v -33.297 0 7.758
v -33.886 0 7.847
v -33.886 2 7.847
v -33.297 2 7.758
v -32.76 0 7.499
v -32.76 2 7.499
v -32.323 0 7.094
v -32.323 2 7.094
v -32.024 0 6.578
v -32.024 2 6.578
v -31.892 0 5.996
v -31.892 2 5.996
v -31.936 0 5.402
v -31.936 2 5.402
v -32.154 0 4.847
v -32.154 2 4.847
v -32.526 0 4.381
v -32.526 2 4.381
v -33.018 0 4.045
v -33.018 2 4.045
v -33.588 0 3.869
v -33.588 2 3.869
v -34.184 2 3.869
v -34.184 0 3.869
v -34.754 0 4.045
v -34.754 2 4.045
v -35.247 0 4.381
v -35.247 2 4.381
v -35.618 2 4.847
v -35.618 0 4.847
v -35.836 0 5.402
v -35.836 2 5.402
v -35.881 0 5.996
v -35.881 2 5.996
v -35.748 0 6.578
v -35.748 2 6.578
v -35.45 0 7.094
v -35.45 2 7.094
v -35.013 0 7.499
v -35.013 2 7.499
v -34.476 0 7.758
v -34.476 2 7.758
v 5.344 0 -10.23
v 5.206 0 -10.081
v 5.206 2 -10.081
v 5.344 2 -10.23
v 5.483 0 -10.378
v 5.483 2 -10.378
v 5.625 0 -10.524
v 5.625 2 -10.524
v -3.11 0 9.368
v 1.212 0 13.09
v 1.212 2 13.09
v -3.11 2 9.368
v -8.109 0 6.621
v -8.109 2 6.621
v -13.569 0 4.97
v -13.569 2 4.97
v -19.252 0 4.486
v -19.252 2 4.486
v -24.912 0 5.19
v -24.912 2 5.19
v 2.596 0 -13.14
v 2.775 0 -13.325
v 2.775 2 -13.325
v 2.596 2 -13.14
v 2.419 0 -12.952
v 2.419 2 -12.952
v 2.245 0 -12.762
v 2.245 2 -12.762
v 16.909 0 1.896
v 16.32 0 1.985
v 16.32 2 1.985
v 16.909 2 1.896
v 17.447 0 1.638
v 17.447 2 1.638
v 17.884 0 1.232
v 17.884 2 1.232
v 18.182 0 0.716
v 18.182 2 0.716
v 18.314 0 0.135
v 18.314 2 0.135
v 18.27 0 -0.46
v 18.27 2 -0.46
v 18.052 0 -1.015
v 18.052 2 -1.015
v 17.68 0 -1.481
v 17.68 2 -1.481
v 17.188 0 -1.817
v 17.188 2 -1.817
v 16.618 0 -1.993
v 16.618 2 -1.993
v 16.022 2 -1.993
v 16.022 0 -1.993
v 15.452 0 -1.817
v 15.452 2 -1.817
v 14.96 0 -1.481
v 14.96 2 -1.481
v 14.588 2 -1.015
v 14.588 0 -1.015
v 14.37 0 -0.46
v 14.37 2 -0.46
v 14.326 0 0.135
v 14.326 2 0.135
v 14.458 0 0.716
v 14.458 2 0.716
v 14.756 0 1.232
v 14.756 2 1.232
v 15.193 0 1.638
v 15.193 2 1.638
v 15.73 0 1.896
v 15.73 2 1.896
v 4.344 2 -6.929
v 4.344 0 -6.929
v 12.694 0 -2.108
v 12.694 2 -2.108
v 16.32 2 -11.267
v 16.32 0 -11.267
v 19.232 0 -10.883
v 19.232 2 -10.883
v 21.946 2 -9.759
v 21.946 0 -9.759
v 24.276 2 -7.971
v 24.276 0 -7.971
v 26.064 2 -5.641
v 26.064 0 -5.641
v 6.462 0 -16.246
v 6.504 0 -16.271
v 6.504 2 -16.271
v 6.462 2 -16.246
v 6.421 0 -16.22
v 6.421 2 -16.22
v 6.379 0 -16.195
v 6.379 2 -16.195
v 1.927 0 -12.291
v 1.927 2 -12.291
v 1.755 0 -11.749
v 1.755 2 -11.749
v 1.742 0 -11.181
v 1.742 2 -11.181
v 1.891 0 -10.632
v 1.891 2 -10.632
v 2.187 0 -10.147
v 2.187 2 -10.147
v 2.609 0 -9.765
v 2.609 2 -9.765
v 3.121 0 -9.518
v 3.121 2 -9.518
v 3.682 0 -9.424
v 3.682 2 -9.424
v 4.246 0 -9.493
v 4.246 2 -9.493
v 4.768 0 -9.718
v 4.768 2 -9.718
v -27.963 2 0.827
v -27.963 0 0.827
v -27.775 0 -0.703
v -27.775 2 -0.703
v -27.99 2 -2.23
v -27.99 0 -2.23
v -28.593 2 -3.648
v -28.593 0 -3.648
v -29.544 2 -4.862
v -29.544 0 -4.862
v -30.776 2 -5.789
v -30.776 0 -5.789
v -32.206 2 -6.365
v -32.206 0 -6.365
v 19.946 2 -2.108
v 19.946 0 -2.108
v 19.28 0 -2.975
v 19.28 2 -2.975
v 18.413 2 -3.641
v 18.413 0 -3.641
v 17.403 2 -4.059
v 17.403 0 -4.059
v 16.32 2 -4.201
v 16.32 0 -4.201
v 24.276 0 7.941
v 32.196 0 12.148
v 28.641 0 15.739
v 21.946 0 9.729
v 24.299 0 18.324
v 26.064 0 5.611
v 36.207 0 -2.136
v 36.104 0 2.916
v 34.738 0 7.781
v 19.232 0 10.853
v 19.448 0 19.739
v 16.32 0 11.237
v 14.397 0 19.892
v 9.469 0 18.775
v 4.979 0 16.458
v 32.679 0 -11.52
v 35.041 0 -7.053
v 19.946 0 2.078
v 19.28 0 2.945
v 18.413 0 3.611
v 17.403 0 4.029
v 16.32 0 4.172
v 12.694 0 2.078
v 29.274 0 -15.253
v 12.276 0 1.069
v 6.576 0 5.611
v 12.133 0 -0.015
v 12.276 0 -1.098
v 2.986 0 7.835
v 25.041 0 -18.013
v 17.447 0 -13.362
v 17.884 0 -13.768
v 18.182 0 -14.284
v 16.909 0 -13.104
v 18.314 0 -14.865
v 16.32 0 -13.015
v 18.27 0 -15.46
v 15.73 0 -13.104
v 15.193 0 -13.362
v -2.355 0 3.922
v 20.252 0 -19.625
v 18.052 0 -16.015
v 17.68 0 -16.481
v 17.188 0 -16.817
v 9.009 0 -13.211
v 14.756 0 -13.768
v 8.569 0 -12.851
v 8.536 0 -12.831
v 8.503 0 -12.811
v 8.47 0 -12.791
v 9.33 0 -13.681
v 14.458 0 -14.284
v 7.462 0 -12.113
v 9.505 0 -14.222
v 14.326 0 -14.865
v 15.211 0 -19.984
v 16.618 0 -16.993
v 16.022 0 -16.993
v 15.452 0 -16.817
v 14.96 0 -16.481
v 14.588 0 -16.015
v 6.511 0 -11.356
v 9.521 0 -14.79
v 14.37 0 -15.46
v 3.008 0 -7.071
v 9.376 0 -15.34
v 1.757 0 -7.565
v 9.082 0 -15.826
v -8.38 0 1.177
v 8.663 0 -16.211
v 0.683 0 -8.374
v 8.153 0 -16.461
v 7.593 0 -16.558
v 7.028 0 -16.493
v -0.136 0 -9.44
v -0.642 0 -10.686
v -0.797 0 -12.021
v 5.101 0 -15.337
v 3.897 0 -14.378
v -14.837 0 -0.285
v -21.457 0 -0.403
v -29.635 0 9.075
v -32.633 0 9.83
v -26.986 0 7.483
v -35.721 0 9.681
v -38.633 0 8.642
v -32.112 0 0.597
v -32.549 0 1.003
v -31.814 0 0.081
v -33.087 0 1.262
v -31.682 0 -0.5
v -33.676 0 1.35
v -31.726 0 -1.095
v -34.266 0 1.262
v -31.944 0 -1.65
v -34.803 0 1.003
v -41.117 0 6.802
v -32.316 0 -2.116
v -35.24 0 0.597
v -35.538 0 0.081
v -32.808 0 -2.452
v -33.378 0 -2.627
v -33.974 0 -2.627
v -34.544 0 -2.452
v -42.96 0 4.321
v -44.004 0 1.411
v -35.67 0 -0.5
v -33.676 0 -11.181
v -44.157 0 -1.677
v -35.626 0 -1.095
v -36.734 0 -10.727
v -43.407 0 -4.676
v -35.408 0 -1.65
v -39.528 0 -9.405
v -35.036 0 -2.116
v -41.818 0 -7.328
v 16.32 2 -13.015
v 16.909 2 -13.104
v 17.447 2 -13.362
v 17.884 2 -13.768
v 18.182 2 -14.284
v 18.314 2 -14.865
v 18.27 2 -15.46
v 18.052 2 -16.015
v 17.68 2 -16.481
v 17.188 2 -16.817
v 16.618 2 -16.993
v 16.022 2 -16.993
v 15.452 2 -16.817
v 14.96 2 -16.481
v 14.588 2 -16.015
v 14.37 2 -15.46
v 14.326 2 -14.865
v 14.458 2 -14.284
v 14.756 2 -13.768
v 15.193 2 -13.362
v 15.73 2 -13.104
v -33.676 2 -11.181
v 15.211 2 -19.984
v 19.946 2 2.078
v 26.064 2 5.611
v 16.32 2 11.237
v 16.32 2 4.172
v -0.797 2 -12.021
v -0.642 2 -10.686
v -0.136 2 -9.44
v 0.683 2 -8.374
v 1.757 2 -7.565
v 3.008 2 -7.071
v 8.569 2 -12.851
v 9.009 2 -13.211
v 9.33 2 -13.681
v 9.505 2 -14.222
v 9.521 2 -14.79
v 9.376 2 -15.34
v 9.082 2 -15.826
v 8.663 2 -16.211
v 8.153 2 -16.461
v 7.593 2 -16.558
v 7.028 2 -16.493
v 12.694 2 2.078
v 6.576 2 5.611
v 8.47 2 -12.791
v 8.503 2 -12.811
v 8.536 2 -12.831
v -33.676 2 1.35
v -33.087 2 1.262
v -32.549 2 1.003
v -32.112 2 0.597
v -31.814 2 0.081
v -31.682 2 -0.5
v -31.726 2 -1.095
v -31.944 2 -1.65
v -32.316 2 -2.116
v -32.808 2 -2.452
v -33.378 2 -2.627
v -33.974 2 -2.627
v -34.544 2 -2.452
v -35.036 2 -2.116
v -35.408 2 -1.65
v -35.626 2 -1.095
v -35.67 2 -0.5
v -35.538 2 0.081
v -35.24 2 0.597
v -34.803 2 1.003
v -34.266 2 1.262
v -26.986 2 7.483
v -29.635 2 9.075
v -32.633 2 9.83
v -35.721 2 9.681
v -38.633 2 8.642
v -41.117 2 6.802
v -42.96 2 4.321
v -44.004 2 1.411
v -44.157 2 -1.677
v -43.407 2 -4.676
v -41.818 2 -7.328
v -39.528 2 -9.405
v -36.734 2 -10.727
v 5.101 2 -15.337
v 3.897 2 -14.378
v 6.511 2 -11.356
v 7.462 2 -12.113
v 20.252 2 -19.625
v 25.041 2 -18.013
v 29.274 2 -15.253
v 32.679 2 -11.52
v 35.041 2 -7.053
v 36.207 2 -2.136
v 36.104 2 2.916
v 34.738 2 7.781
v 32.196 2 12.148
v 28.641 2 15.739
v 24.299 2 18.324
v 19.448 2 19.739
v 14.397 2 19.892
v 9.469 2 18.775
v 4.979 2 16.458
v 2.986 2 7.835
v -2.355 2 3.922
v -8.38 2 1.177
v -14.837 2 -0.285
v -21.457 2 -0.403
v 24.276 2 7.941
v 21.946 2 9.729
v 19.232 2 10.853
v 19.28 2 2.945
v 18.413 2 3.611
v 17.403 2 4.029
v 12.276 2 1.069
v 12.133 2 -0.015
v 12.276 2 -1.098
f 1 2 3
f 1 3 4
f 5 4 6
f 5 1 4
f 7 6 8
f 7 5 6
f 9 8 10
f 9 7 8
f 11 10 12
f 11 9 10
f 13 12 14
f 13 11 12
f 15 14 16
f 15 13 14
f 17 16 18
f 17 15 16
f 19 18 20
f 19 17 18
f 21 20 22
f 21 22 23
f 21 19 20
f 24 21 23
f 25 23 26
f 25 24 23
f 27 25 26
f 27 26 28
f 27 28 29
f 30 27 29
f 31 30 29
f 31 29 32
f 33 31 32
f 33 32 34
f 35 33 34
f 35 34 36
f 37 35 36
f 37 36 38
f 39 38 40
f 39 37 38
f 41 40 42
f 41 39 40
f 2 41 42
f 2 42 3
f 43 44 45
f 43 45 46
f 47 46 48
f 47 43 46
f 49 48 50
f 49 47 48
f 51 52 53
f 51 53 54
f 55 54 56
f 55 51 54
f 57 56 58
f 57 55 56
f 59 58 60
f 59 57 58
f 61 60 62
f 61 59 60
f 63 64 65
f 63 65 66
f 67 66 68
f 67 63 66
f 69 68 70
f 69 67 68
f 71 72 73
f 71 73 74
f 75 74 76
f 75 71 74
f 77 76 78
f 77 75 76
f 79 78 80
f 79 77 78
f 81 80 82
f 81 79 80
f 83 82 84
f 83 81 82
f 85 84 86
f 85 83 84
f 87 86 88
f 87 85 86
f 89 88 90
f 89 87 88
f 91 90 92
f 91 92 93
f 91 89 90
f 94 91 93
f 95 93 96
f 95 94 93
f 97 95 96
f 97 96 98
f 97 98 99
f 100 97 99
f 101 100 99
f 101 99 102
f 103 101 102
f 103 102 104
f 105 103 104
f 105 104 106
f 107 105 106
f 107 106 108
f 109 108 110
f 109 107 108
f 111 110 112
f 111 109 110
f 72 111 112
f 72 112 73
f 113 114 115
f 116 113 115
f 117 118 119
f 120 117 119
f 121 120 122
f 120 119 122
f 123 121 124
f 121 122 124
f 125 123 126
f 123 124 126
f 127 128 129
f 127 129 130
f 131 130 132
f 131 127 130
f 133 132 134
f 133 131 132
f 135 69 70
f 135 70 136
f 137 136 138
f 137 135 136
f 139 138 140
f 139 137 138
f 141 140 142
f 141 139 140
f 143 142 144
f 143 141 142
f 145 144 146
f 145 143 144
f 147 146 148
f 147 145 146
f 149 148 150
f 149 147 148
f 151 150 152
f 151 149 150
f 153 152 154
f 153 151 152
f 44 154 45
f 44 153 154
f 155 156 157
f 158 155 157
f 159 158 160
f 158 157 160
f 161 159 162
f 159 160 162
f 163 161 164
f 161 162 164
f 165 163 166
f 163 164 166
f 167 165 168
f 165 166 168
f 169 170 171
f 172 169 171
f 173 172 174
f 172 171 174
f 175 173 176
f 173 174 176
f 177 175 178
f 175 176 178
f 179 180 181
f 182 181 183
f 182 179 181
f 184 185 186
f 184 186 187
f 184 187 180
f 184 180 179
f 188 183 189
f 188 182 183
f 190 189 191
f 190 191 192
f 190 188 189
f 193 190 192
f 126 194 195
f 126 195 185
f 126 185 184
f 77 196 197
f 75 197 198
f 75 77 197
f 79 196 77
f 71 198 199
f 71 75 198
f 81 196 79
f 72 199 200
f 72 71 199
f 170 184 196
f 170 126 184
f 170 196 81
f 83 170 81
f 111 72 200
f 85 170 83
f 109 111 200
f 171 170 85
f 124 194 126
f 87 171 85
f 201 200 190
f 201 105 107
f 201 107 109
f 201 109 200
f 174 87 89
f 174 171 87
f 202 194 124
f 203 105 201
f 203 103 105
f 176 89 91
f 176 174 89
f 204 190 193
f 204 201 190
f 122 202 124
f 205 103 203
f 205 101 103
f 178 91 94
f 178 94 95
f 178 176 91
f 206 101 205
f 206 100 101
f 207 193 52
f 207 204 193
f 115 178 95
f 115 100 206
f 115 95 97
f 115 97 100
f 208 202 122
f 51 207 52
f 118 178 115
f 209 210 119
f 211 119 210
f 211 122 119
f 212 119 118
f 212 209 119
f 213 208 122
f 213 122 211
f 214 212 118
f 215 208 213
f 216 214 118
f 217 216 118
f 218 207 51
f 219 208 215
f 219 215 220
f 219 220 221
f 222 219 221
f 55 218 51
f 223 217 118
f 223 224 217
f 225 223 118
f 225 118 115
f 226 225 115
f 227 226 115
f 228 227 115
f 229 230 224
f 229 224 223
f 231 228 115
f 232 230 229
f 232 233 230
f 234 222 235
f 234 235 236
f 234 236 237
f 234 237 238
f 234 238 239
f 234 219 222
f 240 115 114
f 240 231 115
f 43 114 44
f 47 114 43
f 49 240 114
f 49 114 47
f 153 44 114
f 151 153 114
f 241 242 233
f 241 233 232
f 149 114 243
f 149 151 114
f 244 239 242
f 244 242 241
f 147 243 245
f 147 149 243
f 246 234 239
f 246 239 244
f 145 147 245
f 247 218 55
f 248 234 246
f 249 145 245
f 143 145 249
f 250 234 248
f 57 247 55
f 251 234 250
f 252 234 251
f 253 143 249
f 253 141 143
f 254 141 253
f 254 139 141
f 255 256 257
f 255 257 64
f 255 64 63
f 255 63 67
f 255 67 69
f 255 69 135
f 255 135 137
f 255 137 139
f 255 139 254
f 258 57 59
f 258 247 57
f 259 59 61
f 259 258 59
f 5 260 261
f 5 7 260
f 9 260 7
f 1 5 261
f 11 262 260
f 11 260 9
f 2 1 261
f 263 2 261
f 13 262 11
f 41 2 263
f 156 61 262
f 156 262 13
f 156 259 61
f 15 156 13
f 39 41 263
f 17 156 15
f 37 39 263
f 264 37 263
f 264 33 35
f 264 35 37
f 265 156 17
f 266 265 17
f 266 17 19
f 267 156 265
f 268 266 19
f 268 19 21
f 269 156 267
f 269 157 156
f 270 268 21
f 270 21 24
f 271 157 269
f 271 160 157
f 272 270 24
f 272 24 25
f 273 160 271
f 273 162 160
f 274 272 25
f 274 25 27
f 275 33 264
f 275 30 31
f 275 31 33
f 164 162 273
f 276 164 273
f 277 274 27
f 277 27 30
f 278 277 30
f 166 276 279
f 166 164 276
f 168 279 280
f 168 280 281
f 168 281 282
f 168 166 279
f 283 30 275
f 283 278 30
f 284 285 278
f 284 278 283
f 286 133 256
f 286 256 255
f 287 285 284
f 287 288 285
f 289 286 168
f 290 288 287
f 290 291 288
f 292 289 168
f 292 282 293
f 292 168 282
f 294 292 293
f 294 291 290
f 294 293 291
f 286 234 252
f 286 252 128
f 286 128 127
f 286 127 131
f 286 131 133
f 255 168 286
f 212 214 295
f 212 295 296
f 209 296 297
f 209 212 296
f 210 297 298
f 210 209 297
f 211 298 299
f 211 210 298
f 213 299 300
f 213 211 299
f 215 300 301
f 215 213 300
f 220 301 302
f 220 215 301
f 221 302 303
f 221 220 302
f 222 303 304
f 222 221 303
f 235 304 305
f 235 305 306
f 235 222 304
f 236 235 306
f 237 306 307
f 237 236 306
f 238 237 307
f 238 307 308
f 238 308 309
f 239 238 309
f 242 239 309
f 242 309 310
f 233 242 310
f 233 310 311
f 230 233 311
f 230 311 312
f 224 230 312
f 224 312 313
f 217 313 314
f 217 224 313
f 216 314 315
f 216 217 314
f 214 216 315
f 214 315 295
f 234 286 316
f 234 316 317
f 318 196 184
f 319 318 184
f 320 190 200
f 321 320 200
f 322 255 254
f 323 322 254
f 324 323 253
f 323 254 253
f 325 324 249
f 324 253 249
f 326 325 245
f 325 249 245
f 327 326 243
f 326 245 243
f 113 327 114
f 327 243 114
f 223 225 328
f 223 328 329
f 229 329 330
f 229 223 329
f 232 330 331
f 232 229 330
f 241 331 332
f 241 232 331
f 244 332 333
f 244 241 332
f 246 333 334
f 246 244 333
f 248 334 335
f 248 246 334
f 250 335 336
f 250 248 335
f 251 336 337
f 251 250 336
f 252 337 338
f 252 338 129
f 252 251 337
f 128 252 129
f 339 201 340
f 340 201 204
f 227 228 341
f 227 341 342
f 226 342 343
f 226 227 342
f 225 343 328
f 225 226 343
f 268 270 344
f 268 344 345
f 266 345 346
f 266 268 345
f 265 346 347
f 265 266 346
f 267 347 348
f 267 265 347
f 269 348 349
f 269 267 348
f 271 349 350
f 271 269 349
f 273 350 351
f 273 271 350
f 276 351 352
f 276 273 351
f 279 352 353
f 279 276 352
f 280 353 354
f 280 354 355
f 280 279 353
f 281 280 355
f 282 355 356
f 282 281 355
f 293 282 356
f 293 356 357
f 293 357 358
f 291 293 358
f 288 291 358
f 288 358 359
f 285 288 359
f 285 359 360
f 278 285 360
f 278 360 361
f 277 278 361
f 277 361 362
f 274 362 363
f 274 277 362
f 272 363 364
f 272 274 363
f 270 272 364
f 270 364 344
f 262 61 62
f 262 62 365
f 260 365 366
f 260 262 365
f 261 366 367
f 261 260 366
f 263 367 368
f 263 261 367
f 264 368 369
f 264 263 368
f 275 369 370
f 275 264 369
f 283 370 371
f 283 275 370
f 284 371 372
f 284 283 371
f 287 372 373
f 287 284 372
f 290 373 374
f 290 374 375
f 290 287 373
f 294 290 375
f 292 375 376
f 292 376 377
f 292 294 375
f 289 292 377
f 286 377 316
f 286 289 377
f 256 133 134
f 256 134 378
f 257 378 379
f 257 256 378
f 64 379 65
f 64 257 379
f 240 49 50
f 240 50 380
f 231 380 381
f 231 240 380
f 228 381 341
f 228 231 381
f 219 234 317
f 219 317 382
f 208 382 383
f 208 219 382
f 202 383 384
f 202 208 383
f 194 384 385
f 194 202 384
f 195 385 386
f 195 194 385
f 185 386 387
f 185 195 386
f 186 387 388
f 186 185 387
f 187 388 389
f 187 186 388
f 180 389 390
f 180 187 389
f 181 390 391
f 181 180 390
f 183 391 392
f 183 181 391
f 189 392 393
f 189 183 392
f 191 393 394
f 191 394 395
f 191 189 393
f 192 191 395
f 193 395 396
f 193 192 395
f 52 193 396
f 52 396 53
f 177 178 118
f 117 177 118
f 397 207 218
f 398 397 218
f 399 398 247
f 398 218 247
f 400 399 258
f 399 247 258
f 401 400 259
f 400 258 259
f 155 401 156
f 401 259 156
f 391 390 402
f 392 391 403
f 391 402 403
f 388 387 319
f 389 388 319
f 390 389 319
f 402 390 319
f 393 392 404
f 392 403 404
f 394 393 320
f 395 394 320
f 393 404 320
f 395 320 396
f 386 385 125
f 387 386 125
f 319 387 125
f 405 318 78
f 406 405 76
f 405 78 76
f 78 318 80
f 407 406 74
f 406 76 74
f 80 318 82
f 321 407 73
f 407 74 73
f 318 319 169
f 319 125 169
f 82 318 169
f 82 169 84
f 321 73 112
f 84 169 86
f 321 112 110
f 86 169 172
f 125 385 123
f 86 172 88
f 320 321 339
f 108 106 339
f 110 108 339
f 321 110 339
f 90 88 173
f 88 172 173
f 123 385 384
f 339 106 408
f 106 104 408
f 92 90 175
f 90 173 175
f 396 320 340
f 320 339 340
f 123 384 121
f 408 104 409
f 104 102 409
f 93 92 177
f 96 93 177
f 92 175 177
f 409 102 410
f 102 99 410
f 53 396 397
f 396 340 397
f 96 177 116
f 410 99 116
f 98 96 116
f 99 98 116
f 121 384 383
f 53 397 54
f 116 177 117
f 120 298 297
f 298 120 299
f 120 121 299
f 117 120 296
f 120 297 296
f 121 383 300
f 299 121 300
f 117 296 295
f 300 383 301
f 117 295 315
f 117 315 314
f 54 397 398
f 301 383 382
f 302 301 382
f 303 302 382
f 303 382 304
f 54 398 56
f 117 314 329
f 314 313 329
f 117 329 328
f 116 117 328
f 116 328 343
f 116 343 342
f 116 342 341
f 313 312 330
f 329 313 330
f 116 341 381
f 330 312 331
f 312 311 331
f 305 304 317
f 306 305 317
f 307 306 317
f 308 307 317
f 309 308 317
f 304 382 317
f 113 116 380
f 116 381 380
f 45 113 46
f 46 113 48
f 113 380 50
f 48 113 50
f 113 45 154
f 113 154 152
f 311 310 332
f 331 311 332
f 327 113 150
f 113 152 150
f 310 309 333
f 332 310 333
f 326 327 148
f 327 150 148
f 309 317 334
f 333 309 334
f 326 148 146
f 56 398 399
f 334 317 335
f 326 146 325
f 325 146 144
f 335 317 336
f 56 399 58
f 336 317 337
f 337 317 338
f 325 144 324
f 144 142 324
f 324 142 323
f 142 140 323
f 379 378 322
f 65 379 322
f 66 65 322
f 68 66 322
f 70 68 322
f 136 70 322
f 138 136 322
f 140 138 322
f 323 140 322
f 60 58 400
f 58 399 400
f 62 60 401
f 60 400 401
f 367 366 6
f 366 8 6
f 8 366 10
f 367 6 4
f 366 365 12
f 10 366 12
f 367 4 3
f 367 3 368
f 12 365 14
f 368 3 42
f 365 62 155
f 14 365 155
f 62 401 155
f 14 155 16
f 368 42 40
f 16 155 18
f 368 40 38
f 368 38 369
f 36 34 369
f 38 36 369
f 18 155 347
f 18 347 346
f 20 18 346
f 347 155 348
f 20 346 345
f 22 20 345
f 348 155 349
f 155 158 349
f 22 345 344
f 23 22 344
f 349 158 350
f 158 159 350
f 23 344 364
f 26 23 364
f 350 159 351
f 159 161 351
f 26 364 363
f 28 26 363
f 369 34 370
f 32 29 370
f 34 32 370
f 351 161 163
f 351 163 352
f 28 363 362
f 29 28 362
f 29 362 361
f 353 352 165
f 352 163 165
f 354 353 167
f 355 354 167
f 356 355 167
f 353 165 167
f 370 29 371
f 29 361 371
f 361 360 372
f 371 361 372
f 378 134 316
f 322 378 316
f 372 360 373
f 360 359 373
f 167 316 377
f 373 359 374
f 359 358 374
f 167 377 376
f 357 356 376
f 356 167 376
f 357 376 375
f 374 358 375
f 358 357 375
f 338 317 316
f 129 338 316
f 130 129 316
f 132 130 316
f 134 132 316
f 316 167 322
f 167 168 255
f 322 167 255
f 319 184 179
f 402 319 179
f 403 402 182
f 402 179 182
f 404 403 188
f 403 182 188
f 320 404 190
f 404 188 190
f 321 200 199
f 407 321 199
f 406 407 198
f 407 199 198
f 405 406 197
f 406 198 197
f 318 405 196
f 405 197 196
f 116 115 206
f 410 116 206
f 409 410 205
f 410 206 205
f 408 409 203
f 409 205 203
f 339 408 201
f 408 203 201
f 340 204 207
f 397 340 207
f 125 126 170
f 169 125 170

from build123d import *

# Parameters (mm, degrees)
SKETCH1_R           = 2
BOSS_EXTRUDE2_DEPTH = 2


with BuildPart() as part:
    # Sketch1 → Boss-Extrude2 (new body)
    with BuildSketch(Plane(origin=(0, 0, 0), x_dir=(1, 0, 0), z_dir=(0, 1, 0))):
        with BuildLine():
            Line((-33.676027055, 11.180582142), (15.211406628, 19.984204272))
            ThreePointArc((15.211406628, 19.984204272), (34.737966777, -7.78097648), (1.211790987, -13.090152535))
            ThreePointArc((1.211790987, -13.090152535), (-10.79582326, -5.653169844), (-24.912367612, -5.189826572))
            ThreePointArc((-24.912367612, -5.189826572), (-42.960314969, -4.320578887), (-33.676027055, 11.180582142))
        make_face()
        with Locations(Location((-33.676027055, 0.649629179, 0), (0, 0, 270))):
            Circle(SKETCH1_R, mode=Mode.SUBTRACT)
        with Locations(Location((-33.886225149, -5.846971221, 0), (0, 0, 270))):
            Circle(SKETCH1_R, mode=Mode.SUBTRACT)
        with Locations(Location((16.319944597, 0.014949315, 0), (0, 0, 270))):
            Circle(SKETCH1_R, mode=Mode.SUBTRACT)
        with Locations(Location((16.319944597, 15.014949315, 0), (0, 0, 270))):
            Circle(SKETCH1_R, mode=Mode.SUBTRACT)
        with BuildLine():
            Line((-32.205991929, 6.364880551), (-0.796707678, 12.021047159))
            ThreePointArc((-0.796707678, 12.021047159), (0.683130465, 8.373787285), (4.344424088, 6.929019304))
            Line((4.344424088, 6.929019304), (12.69431881, 2.108205339))
            ThreePointArc((12.69431881, 2.108205339), (12.133432549, 0.014949315), (12.69431881, -2.07830671))
            Line((12.69431881, -2.07830671), (6.575597959, -5.61095184))
            Line((6.575597959, -5.61095184), (2.986337283, -7.83499068))
            ThreePointArc((2.986337283, -7.83499068), (-11.570908116, -0.280369046), (-27.962567795, -0.827355859))
            ThreePointArc((-27.962567795, -0.827355859), (-28.59343775, 3.648360156), (-32.205991929, 6.364880551))
        make_face(mode=Mode.SUBTRACT)
        with BuildLine():
            Line((16.319944597, 4.201461363), (16.319944597, 11.266751624))
            ThreePointArc((16.319944597, 11.266751624), (21.945845752, 9.759295953), (26.064291236, 5.64085047))
            Line((26.064291236, 5.64085047), (19.945570385, 2.108205339))
            ThreePointArc((19.945570385, 2.108205339), (18.413200622, 3.640575102), (16.319944597, 4.201461363))
        make_face(mode=Mode.SUBTRACT)
        with BuildLine():
            Line((19.945570385, -2.07830671), (26.064291236, -5.61095184))
            ThreePointArc((26.064291236, -5.61095184), (21.945845752, -9.729397324), (16.319944597, -11.236852995))
            Line((16.319944597, -11.236852995), (16.319944597, -4.171562734))
            ThreePointArc((16.319944597, -4.171562734), (18.413200622, -3.610676472), (19.945570385, -2.07830671))
        make_face(mode=Mode.SUBTRACT)
        with BuildLine():
            ThreePointArc((2.244741471, 12.762469116), (2.384407332, 9.940848466), (5.206027982, 10.080514326))
            ThreePointArc((5.206027982, 10.080514326), (5.413174271, 10.304609299), (5.624838222, 10.524442221))
            ThreePointArc((5.624838222, 10.524442221), (6.978596806, 11.744142082), (8.470307193, 12.790626759))
            ThreePointArc((8.470307193, 12.790626759), (8.519771502, 12.820887047), (8.569352462, 12.850955823))
            ThreePointArc((8.569352462, 12.850955823), (9.246853, 15.59359008), (6.504218744, 16.271090618))
            ThreePointArc((6.504218744, 16.271090618), (6.441427011, 16.233010062), (6.378783011, 16.194686965))
            ThreePointArc((6.378783011, 16.194686965), (4.489608616, 14.869368007), (2.775143075, 13.324680936))
            ThreePointArc((2.775143075, 13.324680936), (2.50708158, 13.046273859), (2.244741471, 12.762469116))
        make_face(mode=Mode.SUBTRACT)
    extrude(amount=BOSS_EXTRUDE2_DEPTH)


solid = part.part
